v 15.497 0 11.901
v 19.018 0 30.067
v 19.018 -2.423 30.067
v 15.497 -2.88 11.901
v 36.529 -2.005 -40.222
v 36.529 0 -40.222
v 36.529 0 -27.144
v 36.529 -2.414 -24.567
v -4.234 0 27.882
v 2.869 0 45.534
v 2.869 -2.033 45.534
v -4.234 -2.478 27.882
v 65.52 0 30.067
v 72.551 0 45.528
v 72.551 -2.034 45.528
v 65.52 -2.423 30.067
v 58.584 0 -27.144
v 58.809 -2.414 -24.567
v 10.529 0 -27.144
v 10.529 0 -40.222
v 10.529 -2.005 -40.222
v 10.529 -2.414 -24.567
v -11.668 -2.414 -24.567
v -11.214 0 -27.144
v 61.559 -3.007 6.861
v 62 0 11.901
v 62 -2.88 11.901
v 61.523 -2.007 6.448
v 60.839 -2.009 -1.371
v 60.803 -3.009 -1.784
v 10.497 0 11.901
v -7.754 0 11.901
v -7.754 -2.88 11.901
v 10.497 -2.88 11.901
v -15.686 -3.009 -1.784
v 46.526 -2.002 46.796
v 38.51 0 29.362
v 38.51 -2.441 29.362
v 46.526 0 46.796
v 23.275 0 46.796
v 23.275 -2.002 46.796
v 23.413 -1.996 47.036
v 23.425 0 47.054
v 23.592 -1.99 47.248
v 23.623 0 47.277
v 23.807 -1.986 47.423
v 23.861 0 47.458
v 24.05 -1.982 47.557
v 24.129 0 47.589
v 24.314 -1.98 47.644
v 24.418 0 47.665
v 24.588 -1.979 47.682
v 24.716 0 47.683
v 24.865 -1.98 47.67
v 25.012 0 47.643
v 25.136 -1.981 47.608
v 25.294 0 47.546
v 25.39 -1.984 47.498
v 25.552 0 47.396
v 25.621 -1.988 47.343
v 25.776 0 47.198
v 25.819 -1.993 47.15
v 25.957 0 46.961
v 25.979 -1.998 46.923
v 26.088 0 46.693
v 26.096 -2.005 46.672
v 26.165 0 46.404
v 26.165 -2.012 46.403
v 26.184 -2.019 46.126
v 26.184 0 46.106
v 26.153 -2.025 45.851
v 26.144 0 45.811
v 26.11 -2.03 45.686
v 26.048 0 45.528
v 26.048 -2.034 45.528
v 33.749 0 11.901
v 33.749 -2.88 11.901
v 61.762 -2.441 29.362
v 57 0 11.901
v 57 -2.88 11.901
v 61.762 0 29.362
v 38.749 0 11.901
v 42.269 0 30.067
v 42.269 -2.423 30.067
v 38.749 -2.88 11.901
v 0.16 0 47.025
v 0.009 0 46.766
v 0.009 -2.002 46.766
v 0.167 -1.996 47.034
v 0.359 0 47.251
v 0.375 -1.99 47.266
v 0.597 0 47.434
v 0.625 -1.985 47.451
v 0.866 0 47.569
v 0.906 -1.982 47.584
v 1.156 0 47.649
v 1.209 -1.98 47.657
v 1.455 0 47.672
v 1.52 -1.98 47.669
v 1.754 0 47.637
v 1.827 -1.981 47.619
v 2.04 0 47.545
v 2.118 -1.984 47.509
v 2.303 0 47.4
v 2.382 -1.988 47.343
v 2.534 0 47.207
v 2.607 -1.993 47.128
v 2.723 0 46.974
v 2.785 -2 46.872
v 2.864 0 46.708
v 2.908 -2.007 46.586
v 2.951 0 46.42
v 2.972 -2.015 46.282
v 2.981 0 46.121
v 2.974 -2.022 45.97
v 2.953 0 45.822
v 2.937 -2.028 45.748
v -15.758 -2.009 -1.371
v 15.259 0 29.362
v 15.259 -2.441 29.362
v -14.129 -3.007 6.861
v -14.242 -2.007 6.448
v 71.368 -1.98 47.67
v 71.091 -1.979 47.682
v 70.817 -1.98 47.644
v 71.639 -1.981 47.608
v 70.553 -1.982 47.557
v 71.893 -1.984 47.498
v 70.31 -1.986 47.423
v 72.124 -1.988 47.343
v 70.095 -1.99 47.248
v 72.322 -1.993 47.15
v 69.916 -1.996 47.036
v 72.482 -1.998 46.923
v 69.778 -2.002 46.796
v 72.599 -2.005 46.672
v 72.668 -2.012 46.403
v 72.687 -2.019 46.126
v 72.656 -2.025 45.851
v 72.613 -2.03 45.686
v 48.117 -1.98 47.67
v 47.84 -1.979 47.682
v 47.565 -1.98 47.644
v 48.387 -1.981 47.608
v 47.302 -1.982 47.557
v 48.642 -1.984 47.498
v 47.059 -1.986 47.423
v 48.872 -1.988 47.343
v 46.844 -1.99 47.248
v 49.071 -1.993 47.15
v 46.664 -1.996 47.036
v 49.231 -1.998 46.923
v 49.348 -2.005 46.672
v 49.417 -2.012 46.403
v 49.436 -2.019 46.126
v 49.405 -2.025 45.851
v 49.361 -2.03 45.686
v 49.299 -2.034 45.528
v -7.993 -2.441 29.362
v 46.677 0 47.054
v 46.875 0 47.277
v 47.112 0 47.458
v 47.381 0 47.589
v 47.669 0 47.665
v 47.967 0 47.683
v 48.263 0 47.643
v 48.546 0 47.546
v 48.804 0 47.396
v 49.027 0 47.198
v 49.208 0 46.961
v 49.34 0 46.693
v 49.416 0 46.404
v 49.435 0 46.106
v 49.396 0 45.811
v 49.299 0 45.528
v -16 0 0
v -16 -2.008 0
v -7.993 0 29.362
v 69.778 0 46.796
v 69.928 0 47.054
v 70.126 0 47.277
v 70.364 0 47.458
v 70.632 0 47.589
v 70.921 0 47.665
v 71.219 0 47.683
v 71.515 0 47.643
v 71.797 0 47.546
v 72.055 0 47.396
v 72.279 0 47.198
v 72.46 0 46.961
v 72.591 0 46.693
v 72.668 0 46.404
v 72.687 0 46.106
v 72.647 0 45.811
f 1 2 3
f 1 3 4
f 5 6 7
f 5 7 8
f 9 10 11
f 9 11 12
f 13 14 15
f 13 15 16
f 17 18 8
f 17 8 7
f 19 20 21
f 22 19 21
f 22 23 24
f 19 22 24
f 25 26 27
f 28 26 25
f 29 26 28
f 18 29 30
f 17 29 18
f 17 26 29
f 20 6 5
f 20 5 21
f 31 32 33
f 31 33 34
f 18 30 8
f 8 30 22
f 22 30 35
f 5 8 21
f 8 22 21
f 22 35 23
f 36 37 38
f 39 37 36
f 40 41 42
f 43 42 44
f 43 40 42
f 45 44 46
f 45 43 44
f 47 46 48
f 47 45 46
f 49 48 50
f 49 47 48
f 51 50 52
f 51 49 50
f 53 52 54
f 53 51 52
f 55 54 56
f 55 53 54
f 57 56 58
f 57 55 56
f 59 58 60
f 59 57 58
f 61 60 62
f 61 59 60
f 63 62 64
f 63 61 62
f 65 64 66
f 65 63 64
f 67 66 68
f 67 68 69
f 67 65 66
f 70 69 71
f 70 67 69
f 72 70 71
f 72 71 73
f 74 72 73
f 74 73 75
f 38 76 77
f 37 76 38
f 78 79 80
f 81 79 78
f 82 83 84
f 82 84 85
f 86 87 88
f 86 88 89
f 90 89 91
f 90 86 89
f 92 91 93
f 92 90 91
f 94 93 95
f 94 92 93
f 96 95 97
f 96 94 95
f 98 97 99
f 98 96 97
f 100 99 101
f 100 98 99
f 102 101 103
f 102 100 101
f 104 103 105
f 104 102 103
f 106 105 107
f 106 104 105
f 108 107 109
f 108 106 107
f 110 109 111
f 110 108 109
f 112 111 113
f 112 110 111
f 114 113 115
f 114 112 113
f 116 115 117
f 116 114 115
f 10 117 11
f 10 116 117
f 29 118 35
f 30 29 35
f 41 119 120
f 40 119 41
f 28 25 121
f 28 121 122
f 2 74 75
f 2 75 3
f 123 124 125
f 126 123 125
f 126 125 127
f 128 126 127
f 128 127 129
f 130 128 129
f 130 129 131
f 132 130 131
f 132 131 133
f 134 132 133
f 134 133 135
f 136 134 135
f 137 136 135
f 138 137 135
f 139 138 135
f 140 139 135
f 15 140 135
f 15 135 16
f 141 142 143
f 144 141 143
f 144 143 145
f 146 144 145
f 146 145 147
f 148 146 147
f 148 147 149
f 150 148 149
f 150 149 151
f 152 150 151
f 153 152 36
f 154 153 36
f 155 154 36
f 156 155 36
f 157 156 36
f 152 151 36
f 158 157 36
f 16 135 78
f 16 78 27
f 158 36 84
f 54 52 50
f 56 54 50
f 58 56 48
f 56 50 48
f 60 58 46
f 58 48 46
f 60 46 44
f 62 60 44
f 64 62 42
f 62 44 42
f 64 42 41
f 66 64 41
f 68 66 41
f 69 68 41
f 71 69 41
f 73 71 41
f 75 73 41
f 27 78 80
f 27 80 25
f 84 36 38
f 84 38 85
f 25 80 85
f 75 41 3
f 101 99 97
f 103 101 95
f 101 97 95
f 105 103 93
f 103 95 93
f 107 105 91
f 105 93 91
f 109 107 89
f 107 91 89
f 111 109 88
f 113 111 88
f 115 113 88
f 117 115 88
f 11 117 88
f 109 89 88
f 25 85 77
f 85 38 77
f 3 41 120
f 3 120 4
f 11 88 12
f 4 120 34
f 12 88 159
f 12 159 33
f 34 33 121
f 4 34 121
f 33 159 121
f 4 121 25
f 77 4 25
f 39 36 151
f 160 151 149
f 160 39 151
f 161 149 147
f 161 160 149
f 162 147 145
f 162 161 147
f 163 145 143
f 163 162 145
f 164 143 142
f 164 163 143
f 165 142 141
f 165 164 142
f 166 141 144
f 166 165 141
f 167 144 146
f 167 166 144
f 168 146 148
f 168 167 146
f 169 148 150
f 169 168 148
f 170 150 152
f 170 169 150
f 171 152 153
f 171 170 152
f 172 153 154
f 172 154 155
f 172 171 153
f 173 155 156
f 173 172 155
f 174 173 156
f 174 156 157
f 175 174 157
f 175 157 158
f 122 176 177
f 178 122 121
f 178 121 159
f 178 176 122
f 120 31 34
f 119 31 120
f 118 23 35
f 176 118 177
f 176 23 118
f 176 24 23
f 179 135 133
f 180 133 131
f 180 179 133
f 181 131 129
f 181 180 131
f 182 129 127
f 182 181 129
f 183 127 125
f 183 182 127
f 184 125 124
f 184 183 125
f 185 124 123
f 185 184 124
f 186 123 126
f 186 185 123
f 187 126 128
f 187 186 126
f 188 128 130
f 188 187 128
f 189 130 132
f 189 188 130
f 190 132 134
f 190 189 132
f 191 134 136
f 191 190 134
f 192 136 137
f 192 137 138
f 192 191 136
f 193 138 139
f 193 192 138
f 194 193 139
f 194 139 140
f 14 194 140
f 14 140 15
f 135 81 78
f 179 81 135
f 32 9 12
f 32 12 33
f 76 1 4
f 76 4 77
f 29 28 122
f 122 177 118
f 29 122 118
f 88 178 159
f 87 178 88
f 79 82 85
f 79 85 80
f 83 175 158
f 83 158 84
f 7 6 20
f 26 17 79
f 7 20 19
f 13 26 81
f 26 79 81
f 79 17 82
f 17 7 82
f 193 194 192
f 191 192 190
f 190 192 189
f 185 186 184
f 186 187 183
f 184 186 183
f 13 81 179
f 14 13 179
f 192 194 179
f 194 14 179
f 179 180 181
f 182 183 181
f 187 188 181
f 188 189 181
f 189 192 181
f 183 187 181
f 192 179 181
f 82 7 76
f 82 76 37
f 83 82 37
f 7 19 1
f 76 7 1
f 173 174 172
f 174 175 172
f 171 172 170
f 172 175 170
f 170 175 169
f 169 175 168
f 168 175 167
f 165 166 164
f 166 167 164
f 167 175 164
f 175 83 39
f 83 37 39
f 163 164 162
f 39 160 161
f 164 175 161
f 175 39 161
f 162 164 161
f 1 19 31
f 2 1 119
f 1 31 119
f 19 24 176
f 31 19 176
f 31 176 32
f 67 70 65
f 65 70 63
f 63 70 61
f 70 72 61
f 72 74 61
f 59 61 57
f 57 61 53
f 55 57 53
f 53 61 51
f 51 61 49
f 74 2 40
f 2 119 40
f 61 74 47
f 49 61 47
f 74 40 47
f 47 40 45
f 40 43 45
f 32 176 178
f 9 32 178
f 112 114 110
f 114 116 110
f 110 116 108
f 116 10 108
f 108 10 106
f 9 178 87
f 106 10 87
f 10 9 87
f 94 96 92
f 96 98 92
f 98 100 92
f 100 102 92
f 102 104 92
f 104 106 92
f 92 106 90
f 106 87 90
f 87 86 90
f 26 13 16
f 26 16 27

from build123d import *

# Parameters (mm, degrees)
BOSS_EXTRUDE1_START = -16
BOSS_EXTRUDE1_DEPTH = 89.157051
SKETCH3_OUTSIDE_W   = 116.287
SKETCH3_OUTSIDE_H   = 115.611
CUT_EXTRUDE1_DEPTH  = 88.677780629
CUT_EXTRUDE2_START  = 10.52923
CUT_EXTRUDE2_DEPTH  = 98.513759981
CUT_EXTRUDE3_START  = 36.52923
CUT_EXTRUDE3_DEPTH  = 51.455299981


with BuildPart() as part:
    # Sketch2 → Boss-Extrude1 (new body)
    with BuildSketch(Plane(origin=(0, 0, 0), x_dir=(0, 0, -1), z_dir=(1, 0, 0)).offset(BOSS_EXTRUDE1_START)):
        Polygon((1.783532587, -3.008705321), (40.247767664, -2.004301248), (40.22160329, 0), (-48.232632079, 0), (-48.232632079, -1.965470246), (-6.861445597, -3.00715824), (-6.448065556, -2.007232202), (1.370510461, -2.008631392), align=None)
    extrude(amount=BOSS_EXTRUDE1_DEPTH)

    # Sketch3 outside → Cut-Extrude1 (cut, through all)
    with BuildSketch(Plane(origin=(0, 0, 0), x_dir=(1, 0, 0), z_dir=(0, 1, 0))):
        with Locations((28.5785, -3.9925)):
            Rectangle(SKETCH3_OUTSIDE_W, SKETCH3_OUTSIDE_H)
        with BuildLine():
            Line((-16, 0), (-7.992764086, -29.362208482))
            Line((-7.992764086, -29.362208482), (0.009083526, -46.765523098))
            ThreePointArc((0.009083526, -46.765523098), (2.039982857, -47.545155183), (2.868544584, -45.533721926))
            Line((2.868544584, -45.533721926), (-4.233993603, -27.882047686))
            Line((-4.233993603, -27.882047686), (-7.754483566, -11.901176784))
            Line((-7.754483566, -11.901176784), (10.497010956, -11.901176784))
            Line((10.497010956, -11.901176784), (15.258730436, -29.362208482))
            Line((15.258730436, -29.362208482), (23.274636539, -46.796099079))
            ThreePointArc((23.274636539, -46.796099079), (25.294023142, -47.545803313), (26.047958994, -45.527992762))
            Line((26.047958994, -45.527992762), (19.017500919, -30.066904431))
            Line((19.017500919, -30.066904431), (15.497010956, -11.901176784))
            Line((15.497010956, -11.901176784), (33.748505478, -11.901176784))
            Line((33.748505478, -11.901176784), (38.510224958, -29.362208482))
            Line((38.510224958, -29.362208482), (46.526131062, -46.796099079))
            ThreePointArc((46.526131062, -46.796099079), (48.545517664, -47.545803313), (49.299453516, -45.527992762))
            Line((49.299453516, -45.527992762), (42.268995441, -30.066904431))
            Line((42.268995441, -30.066904431), (38.748505478, -11.901176784))
            Line((38.748505478, -11.901176784), (57, -11.901176784))
            Line((57, -11.901176784), (61.76171948, -29.362208482))
            Line((61.76171948, -29.362208482), (69.777625584, -46.796099079))
            ThreePointArc((69.777625584, -46.796099079), (71.797012186, -47.545803313), (72.550948038, -45.527992762))
            Line((72.550948038, -45.527992762), (65.520489963, -30.066904431))
            Line((65.520489963, -30.066904431), (62, -11.901176784))
            Line((62, -11.901176784), (57.439847632, 40.22160329))
            Line((57.439847632, 40.22160329), (-8.907846133, 40.22160329))
            Line((-8.907846133, 40.22160329), (-16, 0))
        make_face(mode=Mode.SUBTRACT)
    extrude(amount=-CUT_EXTRUDE1_DEPTH, mode=Mode.SUBTRACT)

    # Sketch4 → Cut-Extrude2 (cut, through all)
    with BuildSketch(Plane(origin=(0, 0, 0), x_dir=(0, 0, -1), z_dir=(1, 0, 0)).offset(CUT_EXTRUDE2_START)):
        Polygon((24.567378522, -2.413758155), (27.144470315, 0), (40.22160329, 0), (40.247767664, -2.004301248), align=None)
    extrude(amount=-CUT_EXTRUDE2_DEPTH, mode=Mode.SUBTRACT)

    # Sketch4<2> → Cut-Extrude3 (cut, through all)
    with BuildSketch(Plane(origin=(0, 0, 0), x_dir=(0, 0, -1), z_dir=(1, 0, 0)).offset(CUT_EXTRUDE3_START)):
        Polygon((24.567378522, -2.413758155), (27.144470315, 0), (40.22160329, 0), (40.247767664, -2.004301248), align=None)
    extrude(amount=CUT_EXTRUDE3_DEPTH, mode=Mode.SUBTRACT)


solid = part.part
